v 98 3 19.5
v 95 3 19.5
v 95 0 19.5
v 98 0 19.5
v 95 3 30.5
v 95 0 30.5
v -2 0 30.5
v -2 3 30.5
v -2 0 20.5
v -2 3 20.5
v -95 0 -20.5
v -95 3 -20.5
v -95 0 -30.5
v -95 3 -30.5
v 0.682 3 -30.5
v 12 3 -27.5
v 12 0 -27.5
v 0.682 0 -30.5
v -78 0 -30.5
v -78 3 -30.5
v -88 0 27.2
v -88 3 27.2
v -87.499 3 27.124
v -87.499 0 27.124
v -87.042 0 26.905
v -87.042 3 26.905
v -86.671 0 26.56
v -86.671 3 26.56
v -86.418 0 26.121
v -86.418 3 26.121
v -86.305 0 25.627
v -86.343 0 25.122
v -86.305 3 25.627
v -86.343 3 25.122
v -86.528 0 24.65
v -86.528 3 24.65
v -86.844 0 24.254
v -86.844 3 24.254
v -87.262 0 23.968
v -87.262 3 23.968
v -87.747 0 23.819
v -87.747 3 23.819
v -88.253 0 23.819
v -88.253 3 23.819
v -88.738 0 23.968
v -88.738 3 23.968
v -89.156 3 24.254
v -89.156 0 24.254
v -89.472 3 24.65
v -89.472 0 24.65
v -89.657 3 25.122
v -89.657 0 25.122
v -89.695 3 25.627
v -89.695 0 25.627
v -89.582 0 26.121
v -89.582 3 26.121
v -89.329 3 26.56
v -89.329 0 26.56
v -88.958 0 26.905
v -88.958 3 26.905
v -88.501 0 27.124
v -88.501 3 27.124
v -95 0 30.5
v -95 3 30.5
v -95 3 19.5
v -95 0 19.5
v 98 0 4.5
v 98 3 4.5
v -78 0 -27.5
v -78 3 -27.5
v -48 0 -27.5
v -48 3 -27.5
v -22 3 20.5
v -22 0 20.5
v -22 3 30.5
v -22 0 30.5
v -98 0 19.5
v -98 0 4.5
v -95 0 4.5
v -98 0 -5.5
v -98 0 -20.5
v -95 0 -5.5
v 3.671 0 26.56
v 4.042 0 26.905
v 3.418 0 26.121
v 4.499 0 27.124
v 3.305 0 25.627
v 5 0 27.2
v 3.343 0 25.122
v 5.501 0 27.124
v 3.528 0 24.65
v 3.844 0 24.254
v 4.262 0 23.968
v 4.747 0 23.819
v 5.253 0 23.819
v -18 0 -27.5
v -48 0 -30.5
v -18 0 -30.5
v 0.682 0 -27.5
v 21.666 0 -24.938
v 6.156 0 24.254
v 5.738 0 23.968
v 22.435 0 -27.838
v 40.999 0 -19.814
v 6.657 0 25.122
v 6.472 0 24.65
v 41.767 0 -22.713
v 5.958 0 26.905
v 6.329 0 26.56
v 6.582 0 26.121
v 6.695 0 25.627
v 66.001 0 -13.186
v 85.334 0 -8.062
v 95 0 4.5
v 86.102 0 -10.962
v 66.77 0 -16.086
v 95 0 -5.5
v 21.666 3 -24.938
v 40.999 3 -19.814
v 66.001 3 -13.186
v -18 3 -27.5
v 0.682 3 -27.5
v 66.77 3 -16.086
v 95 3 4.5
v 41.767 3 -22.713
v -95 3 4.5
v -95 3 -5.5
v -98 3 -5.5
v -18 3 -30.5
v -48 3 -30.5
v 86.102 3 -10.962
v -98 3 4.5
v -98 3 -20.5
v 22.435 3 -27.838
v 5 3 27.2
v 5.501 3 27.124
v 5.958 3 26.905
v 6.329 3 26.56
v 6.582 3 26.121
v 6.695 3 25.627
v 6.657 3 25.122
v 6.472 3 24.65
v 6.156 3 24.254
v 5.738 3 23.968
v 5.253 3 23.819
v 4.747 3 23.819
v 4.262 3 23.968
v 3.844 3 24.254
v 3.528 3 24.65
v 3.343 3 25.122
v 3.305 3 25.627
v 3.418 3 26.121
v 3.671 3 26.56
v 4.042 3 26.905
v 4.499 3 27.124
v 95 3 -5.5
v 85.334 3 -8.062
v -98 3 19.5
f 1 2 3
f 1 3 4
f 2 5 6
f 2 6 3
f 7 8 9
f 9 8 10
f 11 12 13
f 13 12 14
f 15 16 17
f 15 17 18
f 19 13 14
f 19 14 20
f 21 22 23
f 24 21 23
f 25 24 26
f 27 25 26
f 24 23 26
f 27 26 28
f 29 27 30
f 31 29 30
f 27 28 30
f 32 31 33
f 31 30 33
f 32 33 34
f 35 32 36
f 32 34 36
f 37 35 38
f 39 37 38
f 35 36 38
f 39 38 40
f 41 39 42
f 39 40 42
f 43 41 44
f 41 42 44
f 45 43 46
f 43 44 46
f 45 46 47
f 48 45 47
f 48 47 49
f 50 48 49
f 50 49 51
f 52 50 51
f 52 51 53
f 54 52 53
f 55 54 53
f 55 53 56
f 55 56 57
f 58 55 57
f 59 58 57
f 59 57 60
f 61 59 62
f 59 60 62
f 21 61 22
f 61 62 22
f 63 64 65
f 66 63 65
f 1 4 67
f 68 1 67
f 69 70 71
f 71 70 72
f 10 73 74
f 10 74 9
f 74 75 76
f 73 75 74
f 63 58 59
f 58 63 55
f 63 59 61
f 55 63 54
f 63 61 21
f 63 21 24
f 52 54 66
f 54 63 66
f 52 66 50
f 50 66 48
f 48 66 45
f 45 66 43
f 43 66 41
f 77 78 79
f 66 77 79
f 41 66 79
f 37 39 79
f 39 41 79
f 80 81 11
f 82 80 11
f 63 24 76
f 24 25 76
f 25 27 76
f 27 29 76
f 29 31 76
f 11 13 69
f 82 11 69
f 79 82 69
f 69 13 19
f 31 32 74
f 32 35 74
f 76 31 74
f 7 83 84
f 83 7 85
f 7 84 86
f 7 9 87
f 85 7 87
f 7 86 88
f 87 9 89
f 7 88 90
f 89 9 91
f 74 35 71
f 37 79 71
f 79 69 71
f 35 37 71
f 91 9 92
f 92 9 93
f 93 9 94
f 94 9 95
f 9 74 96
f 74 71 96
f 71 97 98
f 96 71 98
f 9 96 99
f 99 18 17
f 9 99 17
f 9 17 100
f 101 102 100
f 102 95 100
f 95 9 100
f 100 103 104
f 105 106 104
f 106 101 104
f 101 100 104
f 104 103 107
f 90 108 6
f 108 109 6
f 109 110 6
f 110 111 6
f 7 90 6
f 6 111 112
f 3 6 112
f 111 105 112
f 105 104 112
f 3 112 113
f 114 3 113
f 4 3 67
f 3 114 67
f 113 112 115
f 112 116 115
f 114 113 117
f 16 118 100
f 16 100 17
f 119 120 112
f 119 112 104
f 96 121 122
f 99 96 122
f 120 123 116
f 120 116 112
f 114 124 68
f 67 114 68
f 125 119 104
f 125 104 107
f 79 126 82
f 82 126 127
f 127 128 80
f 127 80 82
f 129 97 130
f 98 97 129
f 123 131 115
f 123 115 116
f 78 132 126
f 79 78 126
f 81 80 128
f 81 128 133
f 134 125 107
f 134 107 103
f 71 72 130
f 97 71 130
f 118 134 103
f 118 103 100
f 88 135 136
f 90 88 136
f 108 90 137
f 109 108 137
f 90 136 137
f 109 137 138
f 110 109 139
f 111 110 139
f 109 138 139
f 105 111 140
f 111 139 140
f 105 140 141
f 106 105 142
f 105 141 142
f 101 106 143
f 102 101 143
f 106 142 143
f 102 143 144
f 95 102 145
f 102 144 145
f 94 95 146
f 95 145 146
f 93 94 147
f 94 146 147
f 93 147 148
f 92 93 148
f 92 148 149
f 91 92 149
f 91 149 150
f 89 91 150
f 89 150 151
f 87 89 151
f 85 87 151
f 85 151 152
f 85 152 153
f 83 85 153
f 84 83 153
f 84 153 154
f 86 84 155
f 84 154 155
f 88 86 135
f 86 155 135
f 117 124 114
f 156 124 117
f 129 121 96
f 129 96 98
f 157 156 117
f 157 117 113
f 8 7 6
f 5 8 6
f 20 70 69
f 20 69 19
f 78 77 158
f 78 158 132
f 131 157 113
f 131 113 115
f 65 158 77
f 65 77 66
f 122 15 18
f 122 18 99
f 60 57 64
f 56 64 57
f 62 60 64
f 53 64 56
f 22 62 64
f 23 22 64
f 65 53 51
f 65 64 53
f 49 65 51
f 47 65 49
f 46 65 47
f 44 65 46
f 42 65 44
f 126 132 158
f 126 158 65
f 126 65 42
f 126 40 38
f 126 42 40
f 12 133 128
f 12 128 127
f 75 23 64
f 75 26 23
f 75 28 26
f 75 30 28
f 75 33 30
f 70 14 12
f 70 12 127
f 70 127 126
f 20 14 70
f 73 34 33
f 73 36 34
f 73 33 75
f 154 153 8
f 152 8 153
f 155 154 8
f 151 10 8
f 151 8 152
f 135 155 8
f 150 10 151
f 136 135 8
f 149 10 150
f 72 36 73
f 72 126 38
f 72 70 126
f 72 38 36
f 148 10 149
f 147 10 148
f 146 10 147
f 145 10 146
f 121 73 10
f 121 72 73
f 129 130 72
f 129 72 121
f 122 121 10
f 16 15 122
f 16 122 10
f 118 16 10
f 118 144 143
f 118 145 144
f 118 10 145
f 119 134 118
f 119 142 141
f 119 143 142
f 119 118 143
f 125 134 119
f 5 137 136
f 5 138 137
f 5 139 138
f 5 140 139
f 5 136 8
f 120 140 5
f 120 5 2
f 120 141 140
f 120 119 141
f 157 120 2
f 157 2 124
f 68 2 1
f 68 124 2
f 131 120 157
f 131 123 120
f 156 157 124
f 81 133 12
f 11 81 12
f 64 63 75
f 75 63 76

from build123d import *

# Parameters (mm, degrees)
SKETCH1_W           = 196
SKETCH1_H           = 61
BOSS_EXTRUDE1_DEPTH = 3
SKETCH2_R           = 1.7
SKETCH2_W           = 3
SKETCH2_H           = 10
SKETCH2_H_2         = 11
SKETCH2_W_2         = 30
SKETCH2_H_3         = 3
SKETCH2_W_3         = 20
CUT_EXTRUDE1_DEPTH  = 3
CUT_EXTRUDE2_DEPTH  = 10
BOSS_EXTRUDE2_DEPTH = 3


with BuildPart() as part:
    # Sketch1 → Boss-Extrude1 (new body)
    with BuildSketch(Plane(origin=(0, 0, 0), x_dir=(1, 0, 0), z_dir=(0, 1, 0))):
        Rectangle(SKETCH1_W, SKETCH1_H)
    extrude(amount=BOSS_EXTRUDE1_DEPTH)

    # Sketch2 → Cut-Extrude1 (cut)
    with BuildSketch(Plane(origin=(0, 3, 0), x_dir=(1, 0, 0), z_dir=(0, 1, 0))):
        with Locations(Location((-88, -25.5, 0), (0, 0, 270))):
            Circle(SKETCH2_R)
        with Locations(Location((5, -25.5, 0), (0, 0, 270))):
            Circle(SKETCH2_R)
        with Locations((-96.5, 25.5)):
            Rectangle(SKETCH2_W, SKETCH2_H)
        with Locations((-96.5, 0.5)):
            Rectangle(SKETCH2_W, SKETCH2_H)
        with Locations((-96.5, -25)):
            Rectangle(SKETCH2_W, SKETCH2_H_2)
        with Locations((96.5, 0.5)):
            Rectangle(SKETCH2_W, SKETCH2_H)
        with Locations((96.5, -25)):
            Rectangle(SKETCH2_W, SKETCH2_H_2)
        with Locations((57, 29)):
            Rectangle(SKETCH2_W_2, SKETCH2_H_3)
        with Locations((-12, -25.5)):
            Rectangle(SKETCH2_W_3, SKETCH2_H)
        with Locations((-63, 29)):
            Rectangle(SKETCH2_W_2, SKETCH2_H_3)
        with Locations((-3, 29)):
            Rectangle(SKETCH2_W_2, SKETCH2_H_3)
        with Locations((96.5, 25.5)):
            Rectangle(SKETCH2_W, SKETCH2_H)
    extrude(amount=-CUT_EXTRUDE1_DEPTH, mode=Mode.SUBTRACT)

    # Sketch3 → Cut-Extrude2 (cut)
    with BuildSketch(Plane(origin=(0, 3, 0), x_dir=(1, 0, 0), z_dir=(0, 1, 0))):
        Polygon((12, 30.5), (98, 30.5), (98, 5.5), (95, 5.5), (85.333795578, 8.062126473), (86.10243352, 10.9619878), (66.770024675, 16.086240747), (66.001386733, 13.18637942), (40.998613267, 19.81362058), (41.767251209, 22.713481907), (22.434842364, 27.837734853), (21.666204422, 24.937873527), (12, 27.5), align=None)
    extrude(amount=-CUT_EXTRUDE2_DEPTH, mode=Mode.SUBTRACT)

    # Sketch4 → Boss-Extrude2 (add)
    with BuildSketch(Plane(origin=(0, 3, 0), x_dir=(1, 0, 0), z_dir=(0, 1, 0))):
        Polygon((12, 27.5), (0.681818182, 30.5), (0.681818182, 27.5), align=None)
    extrude(amount=-BOSS_EXTRUDE2_DEPTH)


solid = part.part
